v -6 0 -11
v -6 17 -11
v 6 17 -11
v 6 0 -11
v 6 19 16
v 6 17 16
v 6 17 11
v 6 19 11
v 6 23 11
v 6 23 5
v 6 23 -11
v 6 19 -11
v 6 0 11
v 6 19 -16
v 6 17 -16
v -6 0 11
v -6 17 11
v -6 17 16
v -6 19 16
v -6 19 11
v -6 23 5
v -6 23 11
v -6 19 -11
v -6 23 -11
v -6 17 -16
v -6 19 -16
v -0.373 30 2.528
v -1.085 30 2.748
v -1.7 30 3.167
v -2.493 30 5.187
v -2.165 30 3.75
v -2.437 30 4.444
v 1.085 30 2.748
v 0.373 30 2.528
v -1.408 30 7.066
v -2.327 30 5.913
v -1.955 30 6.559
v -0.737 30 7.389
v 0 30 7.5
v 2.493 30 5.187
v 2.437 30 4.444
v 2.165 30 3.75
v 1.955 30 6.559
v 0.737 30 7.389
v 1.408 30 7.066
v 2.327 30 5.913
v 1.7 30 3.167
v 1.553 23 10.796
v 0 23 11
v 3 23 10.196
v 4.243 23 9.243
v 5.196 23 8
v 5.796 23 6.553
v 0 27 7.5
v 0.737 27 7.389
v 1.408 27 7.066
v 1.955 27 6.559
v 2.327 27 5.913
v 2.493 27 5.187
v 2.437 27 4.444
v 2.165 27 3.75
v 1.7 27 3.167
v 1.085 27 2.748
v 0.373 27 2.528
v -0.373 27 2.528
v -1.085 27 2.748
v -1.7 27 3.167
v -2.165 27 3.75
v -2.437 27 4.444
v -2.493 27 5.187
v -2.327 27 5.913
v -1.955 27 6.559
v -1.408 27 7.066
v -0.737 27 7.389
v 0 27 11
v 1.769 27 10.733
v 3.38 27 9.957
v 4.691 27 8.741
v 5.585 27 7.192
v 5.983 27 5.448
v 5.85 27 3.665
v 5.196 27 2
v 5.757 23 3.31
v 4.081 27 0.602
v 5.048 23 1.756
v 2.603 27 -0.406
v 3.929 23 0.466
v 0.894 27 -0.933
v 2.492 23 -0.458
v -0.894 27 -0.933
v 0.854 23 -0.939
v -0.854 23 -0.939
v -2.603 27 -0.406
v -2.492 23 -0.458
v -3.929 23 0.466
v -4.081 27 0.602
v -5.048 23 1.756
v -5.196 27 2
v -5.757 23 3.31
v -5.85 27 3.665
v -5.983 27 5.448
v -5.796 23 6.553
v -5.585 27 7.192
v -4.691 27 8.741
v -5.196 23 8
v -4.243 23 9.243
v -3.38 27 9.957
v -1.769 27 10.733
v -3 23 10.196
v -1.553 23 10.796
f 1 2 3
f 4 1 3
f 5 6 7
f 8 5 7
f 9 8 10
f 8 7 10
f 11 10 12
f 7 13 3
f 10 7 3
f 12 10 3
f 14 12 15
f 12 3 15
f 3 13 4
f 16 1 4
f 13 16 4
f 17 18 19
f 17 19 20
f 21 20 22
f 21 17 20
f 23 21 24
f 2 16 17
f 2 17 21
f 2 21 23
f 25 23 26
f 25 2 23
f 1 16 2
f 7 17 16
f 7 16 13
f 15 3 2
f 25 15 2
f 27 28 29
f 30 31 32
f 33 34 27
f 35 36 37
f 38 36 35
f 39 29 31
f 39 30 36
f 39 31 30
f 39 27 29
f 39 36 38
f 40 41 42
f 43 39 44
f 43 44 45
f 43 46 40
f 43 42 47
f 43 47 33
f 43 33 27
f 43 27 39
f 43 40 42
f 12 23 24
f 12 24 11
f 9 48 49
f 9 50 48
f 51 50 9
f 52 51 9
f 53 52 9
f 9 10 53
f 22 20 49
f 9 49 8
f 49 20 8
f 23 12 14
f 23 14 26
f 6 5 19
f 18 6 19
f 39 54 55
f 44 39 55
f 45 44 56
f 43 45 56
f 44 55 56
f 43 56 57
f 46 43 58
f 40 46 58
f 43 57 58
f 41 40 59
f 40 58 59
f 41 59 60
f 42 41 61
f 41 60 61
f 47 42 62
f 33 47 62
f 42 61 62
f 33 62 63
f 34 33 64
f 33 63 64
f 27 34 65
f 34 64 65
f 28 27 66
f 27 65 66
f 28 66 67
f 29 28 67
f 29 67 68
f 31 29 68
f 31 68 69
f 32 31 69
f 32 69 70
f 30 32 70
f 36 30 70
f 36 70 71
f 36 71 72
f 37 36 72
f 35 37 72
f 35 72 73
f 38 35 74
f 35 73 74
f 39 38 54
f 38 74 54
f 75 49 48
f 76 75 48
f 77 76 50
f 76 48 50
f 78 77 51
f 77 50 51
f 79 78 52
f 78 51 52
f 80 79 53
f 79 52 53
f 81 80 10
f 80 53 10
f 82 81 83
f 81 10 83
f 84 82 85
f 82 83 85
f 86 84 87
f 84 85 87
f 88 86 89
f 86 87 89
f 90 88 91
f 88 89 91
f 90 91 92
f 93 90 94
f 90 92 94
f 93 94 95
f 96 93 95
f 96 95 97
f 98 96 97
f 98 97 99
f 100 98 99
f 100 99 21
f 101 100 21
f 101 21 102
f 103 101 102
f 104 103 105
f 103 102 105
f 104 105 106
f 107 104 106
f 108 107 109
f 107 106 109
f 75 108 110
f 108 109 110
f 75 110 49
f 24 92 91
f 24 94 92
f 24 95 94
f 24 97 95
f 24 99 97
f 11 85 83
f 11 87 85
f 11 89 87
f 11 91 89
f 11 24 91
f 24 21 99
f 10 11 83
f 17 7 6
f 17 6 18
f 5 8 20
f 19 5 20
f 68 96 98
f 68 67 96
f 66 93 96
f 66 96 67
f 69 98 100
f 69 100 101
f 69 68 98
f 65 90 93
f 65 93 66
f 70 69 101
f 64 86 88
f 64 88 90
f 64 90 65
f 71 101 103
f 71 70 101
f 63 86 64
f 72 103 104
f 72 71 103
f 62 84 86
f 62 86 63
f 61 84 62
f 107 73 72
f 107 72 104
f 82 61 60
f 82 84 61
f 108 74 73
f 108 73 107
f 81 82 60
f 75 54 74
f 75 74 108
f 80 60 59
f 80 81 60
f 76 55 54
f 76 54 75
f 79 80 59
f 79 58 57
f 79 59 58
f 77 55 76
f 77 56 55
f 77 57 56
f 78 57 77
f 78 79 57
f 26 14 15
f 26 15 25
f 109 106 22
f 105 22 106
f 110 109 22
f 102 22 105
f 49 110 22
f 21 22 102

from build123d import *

# Parameters (mm, degrees)
SKETCH1_W           = 12
SKETCH1_H           = 22
BOSS_EXTRUDE1_DEPTH = 23
SKETCH3_W           = 12
SKETCH3_H           = 2
BOSS_EXTRUDE3_DEPTH = 5
SKETCH2_R           = 6
BOSS_EXTRUDE4_DEPTH = 4
SKETCH4_R           = 2.5
BOSS_EXTRUDE5_DEPTH = 3


with BuildPart() as part:
    # Sketch1 → Boss-Extrude1 (new body)
    with BuildSketch(Plane(origin=(0, 0, 0), x_dir=(1, 0, 0), z_dir=(0, 1, 0))):
        Rectangle(SKETCH1_W, SKETCH1_H)
    extrude(amount=BOSS_EXTRUDE1_DEPTH)

    # Sketch3 → Boss-Extrude3 (add)
    with BuildSketch(Plane(origin=(0, 0, -11), x_dir=(-1, 0, 0), z_dir=(0, 0, -1))):
        with Locations((0, 18)):
            Rectangle(SKETCH3_W, SKETCH3_H)
    boss_extrude3 = extrude(amount=BOSS_EXTRUDE3_DEPTH)

    # Mirror1: Boss-Extrude3 across plane
    add(boss_extrude3.mirror(Plane.XY))

    # Sketch2 → Boss-Extrude4 (add)
    with BuildSketch(Plane(origin=(0, 23, 0), x_dir=(1, 0, 0), z_dir=(0, 1, 0))):
        with Locations(Location((0, -5, 0), (0, 0, 270))):
            Circle(SKETCH2_R)
    extrude(amount=BOSS_EXTRUDE4_DEPTH)

    # Sketch4 → Boss-Extrude5 (add)
    with BuildSketch(Plane(origin=(0, 27, 0), x_dir=(1, 0, 0), z_dir=(0, 1, 0))):
        with Locations(Location((0, -5, 0), (0, 0, 270))):
            Circle(SKETCH4_R)
    extrude(amount=BOSS_EXTRUDE5_DEPTH)


solid = part.part
